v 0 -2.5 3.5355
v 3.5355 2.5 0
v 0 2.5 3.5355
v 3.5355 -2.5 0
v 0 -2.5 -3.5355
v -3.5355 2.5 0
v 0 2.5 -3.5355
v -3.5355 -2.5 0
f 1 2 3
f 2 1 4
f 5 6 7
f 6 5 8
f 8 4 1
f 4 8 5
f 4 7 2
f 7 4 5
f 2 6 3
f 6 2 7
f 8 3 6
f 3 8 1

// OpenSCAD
/*
 * The rotate function revolves the object around the specified axis.
 * Parameters:
 *      - rotate expects a vector for which the object will be rotated about
 *      - vector numbers represent degrees
 */
rotate([0, 45, 0]) // Rotate 45 degrees about the positive y axis wrt. the right hand rule.
    cube([5, 5, 5], center = true);
